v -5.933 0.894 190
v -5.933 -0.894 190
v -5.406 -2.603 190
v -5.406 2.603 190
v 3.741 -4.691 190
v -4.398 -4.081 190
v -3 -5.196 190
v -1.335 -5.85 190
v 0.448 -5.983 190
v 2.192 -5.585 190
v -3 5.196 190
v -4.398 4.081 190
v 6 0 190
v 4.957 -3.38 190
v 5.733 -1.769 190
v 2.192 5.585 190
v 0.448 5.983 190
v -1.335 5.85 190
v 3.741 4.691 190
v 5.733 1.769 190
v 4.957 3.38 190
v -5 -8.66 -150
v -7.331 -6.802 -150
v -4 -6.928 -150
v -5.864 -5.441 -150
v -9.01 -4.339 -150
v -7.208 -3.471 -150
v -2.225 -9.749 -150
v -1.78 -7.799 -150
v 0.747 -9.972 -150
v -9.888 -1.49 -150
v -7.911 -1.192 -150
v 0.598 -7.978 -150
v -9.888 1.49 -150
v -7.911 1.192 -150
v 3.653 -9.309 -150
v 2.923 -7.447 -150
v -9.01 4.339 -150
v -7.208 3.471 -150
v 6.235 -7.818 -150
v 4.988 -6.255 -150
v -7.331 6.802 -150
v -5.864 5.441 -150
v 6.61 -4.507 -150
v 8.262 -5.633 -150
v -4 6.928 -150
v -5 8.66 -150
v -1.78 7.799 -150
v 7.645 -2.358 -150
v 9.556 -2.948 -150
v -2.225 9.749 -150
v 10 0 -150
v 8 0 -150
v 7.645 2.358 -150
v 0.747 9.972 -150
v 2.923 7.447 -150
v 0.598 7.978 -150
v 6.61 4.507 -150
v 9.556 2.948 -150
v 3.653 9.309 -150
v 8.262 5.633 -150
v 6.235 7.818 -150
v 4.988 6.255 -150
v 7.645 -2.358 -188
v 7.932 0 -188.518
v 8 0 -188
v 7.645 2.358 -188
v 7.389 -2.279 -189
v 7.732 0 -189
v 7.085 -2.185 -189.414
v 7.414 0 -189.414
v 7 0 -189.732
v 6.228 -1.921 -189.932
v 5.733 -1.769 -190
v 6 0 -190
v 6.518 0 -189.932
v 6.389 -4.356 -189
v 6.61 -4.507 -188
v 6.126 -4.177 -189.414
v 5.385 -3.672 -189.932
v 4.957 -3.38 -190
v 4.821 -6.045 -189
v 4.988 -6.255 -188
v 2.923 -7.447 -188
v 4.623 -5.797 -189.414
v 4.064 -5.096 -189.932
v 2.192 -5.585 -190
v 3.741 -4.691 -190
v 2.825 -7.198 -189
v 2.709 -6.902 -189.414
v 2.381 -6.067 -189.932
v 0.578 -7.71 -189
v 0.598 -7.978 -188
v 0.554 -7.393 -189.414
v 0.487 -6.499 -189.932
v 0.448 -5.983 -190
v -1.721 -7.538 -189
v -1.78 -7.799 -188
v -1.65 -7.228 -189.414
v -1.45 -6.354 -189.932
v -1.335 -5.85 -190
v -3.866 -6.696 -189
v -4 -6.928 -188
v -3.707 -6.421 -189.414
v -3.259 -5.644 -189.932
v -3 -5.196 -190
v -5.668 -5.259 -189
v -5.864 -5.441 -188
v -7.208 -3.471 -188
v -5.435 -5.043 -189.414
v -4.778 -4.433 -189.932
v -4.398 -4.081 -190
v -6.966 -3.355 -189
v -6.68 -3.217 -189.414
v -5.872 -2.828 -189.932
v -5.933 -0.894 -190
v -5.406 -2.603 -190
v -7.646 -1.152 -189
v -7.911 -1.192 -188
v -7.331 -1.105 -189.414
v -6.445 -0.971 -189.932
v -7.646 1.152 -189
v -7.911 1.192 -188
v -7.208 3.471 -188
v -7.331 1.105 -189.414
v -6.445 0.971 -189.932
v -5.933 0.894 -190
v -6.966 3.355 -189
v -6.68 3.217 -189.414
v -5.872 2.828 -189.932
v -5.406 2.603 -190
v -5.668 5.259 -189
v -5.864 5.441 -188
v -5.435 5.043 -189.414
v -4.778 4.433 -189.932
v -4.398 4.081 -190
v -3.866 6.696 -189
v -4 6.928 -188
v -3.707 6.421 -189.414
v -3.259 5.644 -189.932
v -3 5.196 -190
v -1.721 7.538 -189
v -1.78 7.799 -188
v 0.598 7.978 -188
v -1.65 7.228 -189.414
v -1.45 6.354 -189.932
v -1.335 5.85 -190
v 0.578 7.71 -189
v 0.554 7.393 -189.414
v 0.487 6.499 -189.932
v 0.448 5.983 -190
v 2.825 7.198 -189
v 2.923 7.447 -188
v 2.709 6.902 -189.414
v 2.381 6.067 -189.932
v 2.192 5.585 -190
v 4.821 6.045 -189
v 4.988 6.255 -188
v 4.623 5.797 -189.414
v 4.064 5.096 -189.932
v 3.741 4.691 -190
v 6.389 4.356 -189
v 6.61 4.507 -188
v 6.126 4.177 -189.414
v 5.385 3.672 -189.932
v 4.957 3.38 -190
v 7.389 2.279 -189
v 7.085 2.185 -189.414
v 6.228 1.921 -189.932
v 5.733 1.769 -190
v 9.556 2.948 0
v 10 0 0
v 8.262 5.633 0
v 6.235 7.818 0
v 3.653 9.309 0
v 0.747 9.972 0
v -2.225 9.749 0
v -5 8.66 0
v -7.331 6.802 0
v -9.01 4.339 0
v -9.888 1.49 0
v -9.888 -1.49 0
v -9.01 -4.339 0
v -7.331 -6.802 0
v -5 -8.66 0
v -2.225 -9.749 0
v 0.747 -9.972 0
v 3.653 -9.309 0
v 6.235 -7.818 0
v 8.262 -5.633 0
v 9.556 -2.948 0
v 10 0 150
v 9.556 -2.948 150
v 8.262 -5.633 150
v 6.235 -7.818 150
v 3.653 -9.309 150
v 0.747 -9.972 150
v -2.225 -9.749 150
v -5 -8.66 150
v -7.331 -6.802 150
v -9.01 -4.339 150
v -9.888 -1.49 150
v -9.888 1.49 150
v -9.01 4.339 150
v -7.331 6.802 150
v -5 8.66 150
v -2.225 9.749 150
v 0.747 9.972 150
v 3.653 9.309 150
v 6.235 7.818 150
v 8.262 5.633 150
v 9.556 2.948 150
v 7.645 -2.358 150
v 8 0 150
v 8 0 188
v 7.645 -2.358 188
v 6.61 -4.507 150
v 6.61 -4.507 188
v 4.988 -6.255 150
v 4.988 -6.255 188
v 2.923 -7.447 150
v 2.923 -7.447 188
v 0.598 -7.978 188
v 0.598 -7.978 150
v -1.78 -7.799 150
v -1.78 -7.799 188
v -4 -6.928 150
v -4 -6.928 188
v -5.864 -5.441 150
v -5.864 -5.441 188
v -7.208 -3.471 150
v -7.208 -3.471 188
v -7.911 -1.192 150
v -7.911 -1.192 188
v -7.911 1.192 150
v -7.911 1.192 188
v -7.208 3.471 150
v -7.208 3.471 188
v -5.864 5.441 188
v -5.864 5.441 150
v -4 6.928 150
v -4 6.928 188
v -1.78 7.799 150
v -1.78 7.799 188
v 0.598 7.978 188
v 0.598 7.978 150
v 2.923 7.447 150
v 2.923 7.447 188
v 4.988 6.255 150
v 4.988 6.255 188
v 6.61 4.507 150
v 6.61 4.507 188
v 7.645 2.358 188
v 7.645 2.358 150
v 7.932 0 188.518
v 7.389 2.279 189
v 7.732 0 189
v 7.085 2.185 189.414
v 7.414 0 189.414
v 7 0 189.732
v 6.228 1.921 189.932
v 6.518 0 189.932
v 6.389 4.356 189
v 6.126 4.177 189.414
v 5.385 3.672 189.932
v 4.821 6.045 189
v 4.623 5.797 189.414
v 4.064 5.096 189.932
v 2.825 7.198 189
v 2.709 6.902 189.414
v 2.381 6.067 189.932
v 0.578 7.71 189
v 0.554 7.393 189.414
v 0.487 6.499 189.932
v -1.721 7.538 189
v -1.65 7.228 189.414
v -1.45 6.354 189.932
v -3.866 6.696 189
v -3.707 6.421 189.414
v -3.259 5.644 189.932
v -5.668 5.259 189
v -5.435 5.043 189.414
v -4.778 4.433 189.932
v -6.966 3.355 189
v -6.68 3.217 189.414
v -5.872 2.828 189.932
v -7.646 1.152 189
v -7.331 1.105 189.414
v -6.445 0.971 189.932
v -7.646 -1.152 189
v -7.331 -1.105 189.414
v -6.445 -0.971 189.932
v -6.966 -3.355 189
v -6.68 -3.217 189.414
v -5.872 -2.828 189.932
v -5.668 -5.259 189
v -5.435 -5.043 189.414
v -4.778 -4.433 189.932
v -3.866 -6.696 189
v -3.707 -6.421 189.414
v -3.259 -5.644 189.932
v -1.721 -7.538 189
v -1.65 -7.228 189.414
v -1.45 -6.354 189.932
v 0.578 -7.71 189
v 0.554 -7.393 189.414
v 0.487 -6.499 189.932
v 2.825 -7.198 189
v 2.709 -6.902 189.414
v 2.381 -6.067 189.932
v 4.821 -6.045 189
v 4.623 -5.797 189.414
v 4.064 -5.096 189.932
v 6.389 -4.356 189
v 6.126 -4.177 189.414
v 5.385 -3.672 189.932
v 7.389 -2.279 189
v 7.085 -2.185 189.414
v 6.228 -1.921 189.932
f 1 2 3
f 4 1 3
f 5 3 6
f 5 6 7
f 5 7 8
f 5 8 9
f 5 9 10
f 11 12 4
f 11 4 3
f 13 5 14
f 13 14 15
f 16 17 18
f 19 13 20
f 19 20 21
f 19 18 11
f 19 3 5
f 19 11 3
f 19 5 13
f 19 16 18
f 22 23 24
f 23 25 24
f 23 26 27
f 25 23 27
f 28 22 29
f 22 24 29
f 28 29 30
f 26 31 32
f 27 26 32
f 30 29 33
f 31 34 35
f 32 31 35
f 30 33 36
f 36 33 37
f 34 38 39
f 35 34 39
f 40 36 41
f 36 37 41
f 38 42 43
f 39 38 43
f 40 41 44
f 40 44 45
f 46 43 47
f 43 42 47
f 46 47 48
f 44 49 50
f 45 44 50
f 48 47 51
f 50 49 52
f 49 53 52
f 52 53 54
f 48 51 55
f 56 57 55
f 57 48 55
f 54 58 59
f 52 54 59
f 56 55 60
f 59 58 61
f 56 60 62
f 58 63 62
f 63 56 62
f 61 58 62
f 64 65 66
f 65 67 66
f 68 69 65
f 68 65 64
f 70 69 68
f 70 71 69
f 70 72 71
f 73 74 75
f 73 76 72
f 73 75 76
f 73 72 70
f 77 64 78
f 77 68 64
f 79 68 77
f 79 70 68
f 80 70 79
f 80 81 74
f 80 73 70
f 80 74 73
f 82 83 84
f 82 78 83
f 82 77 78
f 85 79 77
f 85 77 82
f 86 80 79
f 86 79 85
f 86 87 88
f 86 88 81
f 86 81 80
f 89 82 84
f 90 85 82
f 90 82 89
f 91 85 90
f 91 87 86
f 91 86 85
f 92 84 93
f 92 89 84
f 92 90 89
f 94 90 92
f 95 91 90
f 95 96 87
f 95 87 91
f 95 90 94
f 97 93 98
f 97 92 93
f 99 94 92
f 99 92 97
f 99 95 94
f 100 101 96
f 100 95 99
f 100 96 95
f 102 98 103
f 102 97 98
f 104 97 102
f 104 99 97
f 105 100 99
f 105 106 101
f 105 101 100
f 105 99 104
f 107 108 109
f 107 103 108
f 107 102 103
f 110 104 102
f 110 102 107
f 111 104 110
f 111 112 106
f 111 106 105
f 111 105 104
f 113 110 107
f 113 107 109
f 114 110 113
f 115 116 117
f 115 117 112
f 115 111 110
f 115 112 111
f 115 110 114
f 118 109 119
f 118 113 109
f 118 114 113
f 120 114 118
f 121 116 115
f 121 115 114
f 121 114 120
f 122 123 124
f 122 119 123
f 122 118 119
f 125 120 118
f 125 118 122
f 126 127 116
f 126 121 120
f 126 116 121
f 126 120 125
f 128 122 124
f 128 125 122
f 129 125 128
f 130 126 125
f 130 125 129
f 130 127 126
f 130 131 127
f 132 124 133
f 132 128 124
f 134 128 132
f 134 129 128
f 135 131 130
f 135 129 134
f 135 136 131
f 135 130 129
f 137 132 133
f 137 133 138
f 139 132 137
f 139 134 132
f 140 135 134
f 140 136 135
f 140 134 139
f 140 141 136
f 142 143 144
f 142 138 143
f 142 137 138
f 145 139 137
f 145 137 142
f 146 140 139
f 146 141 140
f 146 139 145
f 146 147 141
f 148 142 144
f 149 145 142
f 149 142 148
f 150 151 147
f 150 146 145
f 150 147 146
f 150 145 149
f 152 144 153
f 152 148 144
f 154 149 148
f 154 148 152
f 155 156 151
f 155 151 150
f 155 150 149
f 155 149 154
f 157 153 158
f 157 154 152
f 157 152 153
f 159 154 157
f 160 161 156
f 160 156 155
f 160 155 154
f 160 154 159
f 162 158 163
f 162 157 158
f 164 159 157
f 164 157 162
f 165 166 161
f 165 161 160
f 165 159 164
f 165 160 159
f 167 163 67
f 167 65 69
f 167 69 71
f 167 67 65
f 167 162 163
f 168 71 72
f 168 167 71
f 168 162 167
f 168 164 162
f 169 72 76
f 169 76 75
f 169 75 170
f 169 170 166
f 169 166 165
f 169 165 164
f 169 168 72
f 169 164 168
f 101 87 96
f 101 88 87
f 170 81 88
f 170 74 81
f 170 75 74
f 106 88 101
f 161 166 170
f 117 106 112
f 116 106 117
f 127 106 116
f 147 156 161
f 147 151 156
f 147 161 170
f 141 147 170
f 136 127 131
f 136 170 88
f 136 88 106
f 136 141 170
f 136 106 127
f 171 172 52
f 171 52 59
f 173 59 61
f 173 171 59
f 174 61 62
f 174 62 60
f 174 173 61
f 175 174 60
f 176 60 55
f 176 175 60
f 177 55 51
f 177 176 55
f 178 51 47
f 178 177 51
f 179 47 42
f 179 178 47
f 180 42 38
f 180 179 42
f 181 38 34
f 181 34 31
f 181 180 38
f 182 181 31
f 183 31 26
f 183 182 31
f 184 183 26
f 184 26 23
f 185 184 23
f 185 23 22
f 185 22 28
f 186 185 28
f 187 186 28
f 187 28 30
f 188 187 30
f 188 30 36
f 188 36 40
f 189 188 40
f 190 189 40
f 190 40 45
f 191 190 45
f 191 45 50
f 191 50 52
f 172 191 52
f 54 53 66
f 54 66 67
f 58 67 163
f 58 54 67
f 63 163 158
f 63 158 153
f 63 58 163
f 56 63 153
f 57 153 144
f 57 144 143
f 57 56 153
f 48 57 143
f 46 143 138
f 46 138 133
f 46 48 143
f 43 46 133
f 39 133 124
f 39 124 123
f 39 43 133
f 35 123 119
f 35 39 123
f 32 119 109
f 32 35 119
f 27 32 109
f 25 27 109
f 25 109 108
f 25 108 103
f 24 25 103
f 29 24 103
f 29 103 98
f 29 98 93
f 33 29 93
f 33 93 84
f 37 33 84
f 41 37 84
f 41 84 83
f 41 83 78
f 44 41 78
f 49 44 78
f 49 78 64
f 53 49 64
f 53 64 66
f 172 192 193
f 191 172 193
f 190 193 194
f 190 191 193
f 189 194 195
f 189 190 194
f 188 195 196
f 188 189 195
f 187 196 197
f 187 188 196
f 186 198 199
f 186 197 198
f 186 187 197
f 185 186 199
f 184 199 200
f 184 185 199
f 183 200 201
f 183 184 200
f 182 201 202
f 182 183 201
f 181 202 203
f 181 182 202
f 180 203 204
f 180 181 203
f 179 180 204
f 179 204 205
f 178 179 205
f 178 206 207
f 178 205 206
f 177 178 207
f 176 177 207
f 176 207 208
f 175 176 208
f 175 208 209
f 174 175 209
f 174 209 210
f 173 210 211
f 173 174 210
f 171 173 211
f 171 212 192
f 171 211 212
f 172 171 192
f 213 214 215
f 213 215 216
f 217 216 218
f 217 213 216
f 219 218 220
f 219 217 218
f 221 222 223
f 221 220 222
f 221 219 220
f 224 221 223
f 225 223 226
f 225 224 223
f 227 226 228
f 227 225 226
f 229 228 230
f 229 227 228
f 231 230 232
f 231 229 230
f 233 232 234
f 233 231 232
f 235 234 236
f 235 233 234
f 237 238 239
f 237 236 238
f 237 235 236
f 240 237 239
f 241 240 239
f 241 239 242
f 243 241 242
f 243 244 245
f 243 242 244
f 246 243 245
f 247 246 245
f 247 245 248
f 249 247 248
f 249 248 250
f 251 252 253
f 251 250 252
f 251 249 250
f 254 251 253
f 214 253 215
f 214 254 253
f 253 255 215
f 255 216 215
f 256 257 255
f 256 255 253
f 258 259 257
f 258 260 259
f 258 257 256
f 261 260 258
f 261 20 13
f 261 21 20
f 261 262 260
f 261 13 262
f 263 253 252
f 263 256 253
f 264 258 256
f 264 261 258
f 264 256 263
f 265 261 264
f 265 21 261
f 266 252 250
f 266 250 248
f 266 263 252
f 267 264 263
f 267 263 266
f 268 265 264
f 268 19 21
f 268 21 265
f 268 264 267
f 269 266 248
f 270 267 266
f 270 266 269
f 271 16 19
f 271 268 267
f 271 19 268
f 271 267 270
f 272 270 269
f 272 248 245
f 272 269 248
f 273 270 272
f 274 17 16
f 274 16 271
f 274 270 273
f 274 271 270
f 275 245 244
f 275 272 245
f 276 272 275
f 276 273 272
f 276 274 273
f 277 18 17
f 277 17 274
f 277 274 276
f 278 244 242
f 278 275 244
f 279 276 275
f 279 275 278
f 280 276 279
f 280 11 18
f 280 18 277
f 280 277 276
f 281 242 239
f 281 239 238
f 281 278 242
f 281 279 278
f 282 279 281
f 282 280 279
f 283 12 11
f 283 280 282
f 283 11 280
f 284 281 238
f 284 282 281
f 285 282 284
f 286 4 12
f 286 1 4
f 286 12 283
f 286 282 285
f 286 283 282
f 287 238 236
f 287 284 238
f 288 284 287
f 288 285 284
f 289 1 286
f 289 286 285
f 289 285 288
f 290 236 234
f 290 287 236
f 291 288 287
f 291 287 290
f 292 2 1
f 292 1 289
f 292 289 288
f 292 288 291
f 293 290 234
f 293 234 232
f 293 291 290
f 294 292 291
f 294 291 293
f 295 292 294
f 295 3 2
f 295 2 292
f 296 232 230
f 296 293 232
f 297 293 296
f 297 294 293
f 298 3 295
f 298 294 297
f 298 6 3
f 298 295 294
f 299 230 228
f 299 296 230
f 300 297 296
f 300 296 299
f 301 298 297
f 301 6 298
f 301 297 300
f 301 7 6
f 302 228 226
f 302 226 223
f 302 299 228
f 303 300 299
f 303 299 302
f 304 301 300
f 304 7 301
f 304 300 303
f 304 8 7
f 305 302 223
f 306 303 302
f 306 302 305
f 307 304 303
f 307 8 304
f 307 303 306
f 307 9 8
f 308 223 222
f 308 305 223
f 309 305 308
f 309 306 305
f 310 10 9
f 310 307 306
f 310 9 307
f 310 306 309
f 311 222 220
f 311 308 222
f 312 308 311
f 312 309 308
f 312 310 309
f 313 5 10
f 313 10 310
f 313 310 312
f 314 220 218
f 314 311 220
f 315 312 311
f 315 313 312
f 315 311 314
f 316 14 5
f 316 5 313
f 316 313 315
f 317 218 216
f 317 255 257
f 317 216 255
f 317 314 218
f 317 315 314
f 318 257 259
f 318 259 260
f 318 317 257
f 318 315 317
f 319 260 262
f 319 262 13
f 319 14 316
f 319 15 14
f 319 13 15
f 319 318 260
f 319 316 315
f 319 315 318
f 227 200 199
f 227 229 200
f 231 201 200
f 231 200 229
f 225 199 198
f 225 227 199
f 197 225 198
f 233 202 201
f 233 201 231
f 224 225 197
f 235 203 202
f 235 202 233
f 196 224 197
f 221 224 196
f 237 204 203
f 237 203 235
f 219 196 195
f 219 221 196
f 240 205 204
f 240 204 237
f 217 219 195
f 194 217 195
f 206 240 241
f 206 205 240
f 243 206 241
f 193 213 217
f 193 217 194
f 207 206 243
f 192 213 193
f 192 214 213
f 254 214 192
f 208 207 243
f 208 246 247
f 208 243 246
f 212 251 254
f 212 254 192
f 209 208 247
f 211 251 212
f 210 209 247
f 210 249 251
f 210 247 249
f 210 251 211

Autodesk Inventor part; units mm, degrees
ref_plane "YZ Plane" through (0, 0, 0) normal (1, 0, 0) x (0, 1, 0)
ref_plane "XZ Plane" through (0, 0, 0) normal (0, 1, 0) x (-1, 0, 0)
ref_plane "XY Plane" through (0, 0, 0) normal (0, 0, 1) x (1, 0, 0)
sketch "Esboço1" plane through (0, 0, 0) normal (0, 0, 1) x (1, 0, 0)
  circle A0 centre (0, 0) radius 10
  dimension "d0" = 20
extrude "Extrusão1" add sketch "Esboço1" along normal mid plane 300
sketch "Esboço2" plane through (0, 0, 150) normal (0, 0, 1) x (1, 0, 0)
  circle A0 centre (0, 0) radius 8
  dimension "d3" = 16
extrude "Extrusão2" add sketch "Esboço2" along normal blind 40
fillet "Arredondamento1" radius 2 1 edges at (-8, 0, 190)
mirror "Espelhamento1" about plane through (0, 0, 0) normal (0, 0, 1) of "Extrusão2", "Arredondamento1"
properties part number "Haste da Morsa"
